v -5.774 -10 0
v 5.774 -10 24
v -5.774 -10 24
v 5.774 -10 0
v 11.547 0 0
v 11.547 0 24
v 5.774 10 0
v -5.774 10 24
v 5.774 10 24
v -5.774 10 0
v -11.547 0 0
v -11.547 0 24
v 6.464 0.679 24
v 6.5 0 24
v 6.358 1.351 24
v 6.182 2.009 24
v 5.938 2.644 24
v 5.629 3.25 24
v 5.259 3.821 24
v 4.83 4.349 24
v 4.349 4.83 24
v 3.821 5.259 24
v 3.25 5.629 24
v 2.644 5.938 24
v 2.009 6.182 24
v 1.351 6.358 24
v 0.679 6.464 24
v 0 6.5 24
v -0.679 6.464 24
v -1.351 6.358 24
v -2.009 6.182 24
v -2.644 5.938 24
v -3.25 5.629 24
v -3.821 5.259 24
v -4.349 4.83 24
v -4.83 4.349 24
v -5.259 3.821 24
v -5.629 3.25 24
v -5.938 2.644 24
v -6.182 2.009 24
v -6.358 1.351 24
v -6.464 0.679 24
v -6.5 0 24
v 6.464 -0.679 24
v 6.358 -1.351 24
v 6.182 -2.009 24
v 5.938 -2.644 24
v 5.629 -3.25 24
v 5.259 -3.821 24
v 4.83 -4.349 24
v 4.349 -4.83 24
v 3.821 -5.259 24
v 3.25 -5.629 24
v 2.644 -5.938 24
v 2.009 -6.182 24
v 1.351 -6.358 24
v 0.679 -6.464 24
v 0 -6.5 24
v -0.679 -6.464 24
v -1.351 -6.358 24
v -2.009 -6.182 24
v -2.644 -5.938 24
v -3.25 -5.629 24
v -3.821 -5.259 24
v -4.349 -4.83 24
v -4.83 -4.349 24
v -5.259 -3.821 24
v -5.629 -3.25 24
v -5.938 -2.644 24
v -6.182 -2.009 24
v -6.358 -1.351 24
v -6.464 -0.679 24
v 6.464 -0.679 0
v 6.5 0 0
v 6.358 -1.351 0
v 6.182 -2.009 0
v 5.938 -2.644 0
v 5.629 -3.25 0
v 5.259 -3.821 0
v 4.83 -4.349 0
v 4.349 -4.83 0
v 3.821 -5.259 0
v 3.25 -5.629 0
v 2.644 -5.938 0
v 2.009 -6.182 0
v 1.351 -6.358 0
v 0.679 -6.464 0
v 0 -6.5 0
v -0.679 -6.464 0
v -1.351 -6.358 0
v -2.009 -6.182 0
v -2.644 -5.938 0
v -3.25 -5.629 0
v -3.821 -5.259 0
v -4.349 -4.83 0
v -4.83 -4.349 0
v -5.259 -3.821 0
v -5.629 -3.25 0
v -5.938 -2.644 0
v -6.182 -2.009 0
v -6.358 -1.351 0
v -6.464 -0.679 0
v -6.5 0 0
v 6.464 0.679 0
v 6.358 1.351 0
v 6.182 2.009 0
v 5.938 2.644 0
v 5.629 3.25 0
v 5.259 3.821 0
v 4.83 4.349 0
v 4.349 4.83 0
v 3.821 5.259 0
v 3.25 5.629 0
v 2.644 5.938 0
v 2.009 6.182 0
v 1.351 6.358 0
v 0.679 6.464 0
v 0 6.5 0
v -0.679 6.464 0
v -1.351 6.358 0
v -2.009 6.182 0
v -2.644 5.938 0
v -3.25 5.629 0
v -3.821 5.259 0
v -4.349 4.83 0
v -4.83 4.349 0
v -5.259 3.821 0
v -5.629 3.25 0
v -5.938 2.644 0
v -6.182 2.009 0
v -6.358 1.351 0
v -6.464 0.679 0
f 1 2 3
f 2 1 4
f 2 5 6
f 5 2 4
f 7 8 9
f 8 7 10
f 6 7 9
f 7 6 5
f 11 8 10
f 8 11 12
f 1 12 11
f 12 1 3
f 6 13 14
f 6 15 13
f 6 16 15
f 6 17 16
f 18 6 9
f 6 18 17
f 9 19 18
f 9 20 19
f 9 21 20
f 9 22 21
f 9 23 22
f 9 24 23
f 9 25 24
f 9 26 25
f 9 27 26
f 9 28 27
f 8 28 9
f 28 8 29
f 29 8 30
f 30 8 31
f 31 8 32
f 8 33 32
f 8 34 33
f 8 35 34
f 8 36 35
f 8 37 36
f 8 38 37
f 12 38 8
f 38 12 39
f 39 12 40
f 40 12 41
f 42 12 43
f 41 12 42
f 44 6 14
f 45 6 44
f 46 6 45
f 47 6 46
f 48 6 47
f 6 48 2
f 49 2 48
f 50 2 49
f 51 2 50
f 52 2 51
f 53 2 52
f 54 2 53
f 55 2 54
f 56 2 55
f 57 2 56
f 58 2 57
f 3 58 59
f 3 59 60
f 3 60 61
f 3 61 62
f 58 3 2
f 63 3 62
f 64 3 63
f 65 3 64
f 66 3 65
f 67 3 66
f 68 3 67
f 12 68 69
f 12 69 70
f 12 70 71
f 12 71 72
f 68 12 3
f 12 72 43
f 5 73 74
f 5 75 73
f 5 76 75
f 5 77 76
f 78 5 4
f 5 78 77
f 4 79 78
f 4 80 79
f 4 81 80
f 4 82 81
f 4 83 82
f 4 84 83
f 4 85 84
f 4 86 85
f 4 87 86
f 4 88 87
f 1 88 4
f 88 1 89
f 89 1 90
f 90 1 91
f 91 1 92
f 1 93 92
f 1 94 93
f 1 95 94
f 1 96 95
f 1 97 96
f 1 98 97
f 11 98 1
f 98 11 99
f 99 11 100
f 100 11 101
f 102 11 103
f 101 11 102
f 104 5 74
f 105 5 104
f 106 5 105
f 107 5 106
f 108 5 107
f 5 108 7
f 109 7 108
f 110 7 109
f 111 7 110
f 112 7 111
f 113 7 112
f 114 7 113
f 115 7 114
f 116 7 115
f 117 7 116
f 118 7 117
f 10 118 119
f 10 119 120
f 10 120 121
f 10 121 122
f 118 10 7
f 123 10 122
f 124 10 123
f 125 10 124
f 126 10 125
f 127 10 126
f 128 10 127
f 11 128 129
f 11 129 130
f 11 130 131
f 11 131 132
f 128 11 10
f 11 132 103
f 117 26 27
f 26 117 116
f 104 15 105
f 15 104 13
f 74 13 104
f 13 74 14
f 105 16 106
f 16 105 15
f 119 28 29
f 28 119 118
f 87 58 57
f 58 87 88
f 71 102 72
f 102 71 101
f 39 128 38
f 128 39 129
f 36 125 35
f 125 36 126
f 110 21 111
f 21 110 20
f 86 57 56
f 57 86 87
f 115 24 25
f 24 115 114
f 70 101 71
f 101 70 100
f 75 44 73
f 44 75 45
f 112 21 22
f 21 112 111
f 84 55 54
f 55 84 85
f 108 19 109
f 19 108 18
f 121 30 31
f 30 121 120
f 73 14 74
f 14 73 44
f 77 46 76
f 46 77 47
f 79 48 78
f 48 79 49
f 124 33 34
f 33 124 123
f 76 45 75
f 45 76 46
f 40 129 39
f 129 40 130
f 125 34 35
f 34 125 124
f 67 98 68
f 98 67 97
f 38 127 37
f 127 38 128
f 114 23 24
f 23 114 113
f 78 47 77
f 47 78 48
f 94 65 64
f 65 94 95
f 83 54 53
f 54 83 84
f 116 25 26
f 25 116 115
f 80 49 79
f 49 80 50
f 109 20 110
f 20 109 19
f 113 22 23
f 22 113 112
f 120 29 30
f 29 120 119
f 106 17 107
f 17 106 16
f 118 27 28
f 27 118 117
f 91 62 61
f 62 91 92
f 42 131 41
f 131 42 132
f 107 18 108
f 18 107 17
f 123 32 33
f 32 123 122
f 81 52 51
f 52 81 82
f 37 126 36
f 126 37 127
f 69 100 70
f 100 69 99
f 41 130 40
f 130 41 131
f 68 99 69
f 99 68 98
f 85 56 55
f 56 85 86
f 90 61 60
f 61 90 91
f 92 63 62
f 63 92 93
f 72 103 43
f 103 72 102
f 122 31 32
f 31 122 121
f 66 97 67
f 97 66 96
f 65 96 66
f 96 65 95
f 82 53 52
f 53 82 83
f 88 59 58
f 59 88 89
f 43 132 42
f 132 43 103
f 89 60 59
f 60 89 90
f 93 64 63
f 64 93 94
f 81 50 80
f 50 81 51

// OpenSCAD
// Hex spacer.
$fn = 60;
eps = 0.02;
inner_d = 13;
flat = 20;
length = 24;
difference() { cylinder(d=flat/cos(30),h=length,$fn=6); translate([0,0,-eps]) cylinder(d=inner_d,h=length+2*eps); }
